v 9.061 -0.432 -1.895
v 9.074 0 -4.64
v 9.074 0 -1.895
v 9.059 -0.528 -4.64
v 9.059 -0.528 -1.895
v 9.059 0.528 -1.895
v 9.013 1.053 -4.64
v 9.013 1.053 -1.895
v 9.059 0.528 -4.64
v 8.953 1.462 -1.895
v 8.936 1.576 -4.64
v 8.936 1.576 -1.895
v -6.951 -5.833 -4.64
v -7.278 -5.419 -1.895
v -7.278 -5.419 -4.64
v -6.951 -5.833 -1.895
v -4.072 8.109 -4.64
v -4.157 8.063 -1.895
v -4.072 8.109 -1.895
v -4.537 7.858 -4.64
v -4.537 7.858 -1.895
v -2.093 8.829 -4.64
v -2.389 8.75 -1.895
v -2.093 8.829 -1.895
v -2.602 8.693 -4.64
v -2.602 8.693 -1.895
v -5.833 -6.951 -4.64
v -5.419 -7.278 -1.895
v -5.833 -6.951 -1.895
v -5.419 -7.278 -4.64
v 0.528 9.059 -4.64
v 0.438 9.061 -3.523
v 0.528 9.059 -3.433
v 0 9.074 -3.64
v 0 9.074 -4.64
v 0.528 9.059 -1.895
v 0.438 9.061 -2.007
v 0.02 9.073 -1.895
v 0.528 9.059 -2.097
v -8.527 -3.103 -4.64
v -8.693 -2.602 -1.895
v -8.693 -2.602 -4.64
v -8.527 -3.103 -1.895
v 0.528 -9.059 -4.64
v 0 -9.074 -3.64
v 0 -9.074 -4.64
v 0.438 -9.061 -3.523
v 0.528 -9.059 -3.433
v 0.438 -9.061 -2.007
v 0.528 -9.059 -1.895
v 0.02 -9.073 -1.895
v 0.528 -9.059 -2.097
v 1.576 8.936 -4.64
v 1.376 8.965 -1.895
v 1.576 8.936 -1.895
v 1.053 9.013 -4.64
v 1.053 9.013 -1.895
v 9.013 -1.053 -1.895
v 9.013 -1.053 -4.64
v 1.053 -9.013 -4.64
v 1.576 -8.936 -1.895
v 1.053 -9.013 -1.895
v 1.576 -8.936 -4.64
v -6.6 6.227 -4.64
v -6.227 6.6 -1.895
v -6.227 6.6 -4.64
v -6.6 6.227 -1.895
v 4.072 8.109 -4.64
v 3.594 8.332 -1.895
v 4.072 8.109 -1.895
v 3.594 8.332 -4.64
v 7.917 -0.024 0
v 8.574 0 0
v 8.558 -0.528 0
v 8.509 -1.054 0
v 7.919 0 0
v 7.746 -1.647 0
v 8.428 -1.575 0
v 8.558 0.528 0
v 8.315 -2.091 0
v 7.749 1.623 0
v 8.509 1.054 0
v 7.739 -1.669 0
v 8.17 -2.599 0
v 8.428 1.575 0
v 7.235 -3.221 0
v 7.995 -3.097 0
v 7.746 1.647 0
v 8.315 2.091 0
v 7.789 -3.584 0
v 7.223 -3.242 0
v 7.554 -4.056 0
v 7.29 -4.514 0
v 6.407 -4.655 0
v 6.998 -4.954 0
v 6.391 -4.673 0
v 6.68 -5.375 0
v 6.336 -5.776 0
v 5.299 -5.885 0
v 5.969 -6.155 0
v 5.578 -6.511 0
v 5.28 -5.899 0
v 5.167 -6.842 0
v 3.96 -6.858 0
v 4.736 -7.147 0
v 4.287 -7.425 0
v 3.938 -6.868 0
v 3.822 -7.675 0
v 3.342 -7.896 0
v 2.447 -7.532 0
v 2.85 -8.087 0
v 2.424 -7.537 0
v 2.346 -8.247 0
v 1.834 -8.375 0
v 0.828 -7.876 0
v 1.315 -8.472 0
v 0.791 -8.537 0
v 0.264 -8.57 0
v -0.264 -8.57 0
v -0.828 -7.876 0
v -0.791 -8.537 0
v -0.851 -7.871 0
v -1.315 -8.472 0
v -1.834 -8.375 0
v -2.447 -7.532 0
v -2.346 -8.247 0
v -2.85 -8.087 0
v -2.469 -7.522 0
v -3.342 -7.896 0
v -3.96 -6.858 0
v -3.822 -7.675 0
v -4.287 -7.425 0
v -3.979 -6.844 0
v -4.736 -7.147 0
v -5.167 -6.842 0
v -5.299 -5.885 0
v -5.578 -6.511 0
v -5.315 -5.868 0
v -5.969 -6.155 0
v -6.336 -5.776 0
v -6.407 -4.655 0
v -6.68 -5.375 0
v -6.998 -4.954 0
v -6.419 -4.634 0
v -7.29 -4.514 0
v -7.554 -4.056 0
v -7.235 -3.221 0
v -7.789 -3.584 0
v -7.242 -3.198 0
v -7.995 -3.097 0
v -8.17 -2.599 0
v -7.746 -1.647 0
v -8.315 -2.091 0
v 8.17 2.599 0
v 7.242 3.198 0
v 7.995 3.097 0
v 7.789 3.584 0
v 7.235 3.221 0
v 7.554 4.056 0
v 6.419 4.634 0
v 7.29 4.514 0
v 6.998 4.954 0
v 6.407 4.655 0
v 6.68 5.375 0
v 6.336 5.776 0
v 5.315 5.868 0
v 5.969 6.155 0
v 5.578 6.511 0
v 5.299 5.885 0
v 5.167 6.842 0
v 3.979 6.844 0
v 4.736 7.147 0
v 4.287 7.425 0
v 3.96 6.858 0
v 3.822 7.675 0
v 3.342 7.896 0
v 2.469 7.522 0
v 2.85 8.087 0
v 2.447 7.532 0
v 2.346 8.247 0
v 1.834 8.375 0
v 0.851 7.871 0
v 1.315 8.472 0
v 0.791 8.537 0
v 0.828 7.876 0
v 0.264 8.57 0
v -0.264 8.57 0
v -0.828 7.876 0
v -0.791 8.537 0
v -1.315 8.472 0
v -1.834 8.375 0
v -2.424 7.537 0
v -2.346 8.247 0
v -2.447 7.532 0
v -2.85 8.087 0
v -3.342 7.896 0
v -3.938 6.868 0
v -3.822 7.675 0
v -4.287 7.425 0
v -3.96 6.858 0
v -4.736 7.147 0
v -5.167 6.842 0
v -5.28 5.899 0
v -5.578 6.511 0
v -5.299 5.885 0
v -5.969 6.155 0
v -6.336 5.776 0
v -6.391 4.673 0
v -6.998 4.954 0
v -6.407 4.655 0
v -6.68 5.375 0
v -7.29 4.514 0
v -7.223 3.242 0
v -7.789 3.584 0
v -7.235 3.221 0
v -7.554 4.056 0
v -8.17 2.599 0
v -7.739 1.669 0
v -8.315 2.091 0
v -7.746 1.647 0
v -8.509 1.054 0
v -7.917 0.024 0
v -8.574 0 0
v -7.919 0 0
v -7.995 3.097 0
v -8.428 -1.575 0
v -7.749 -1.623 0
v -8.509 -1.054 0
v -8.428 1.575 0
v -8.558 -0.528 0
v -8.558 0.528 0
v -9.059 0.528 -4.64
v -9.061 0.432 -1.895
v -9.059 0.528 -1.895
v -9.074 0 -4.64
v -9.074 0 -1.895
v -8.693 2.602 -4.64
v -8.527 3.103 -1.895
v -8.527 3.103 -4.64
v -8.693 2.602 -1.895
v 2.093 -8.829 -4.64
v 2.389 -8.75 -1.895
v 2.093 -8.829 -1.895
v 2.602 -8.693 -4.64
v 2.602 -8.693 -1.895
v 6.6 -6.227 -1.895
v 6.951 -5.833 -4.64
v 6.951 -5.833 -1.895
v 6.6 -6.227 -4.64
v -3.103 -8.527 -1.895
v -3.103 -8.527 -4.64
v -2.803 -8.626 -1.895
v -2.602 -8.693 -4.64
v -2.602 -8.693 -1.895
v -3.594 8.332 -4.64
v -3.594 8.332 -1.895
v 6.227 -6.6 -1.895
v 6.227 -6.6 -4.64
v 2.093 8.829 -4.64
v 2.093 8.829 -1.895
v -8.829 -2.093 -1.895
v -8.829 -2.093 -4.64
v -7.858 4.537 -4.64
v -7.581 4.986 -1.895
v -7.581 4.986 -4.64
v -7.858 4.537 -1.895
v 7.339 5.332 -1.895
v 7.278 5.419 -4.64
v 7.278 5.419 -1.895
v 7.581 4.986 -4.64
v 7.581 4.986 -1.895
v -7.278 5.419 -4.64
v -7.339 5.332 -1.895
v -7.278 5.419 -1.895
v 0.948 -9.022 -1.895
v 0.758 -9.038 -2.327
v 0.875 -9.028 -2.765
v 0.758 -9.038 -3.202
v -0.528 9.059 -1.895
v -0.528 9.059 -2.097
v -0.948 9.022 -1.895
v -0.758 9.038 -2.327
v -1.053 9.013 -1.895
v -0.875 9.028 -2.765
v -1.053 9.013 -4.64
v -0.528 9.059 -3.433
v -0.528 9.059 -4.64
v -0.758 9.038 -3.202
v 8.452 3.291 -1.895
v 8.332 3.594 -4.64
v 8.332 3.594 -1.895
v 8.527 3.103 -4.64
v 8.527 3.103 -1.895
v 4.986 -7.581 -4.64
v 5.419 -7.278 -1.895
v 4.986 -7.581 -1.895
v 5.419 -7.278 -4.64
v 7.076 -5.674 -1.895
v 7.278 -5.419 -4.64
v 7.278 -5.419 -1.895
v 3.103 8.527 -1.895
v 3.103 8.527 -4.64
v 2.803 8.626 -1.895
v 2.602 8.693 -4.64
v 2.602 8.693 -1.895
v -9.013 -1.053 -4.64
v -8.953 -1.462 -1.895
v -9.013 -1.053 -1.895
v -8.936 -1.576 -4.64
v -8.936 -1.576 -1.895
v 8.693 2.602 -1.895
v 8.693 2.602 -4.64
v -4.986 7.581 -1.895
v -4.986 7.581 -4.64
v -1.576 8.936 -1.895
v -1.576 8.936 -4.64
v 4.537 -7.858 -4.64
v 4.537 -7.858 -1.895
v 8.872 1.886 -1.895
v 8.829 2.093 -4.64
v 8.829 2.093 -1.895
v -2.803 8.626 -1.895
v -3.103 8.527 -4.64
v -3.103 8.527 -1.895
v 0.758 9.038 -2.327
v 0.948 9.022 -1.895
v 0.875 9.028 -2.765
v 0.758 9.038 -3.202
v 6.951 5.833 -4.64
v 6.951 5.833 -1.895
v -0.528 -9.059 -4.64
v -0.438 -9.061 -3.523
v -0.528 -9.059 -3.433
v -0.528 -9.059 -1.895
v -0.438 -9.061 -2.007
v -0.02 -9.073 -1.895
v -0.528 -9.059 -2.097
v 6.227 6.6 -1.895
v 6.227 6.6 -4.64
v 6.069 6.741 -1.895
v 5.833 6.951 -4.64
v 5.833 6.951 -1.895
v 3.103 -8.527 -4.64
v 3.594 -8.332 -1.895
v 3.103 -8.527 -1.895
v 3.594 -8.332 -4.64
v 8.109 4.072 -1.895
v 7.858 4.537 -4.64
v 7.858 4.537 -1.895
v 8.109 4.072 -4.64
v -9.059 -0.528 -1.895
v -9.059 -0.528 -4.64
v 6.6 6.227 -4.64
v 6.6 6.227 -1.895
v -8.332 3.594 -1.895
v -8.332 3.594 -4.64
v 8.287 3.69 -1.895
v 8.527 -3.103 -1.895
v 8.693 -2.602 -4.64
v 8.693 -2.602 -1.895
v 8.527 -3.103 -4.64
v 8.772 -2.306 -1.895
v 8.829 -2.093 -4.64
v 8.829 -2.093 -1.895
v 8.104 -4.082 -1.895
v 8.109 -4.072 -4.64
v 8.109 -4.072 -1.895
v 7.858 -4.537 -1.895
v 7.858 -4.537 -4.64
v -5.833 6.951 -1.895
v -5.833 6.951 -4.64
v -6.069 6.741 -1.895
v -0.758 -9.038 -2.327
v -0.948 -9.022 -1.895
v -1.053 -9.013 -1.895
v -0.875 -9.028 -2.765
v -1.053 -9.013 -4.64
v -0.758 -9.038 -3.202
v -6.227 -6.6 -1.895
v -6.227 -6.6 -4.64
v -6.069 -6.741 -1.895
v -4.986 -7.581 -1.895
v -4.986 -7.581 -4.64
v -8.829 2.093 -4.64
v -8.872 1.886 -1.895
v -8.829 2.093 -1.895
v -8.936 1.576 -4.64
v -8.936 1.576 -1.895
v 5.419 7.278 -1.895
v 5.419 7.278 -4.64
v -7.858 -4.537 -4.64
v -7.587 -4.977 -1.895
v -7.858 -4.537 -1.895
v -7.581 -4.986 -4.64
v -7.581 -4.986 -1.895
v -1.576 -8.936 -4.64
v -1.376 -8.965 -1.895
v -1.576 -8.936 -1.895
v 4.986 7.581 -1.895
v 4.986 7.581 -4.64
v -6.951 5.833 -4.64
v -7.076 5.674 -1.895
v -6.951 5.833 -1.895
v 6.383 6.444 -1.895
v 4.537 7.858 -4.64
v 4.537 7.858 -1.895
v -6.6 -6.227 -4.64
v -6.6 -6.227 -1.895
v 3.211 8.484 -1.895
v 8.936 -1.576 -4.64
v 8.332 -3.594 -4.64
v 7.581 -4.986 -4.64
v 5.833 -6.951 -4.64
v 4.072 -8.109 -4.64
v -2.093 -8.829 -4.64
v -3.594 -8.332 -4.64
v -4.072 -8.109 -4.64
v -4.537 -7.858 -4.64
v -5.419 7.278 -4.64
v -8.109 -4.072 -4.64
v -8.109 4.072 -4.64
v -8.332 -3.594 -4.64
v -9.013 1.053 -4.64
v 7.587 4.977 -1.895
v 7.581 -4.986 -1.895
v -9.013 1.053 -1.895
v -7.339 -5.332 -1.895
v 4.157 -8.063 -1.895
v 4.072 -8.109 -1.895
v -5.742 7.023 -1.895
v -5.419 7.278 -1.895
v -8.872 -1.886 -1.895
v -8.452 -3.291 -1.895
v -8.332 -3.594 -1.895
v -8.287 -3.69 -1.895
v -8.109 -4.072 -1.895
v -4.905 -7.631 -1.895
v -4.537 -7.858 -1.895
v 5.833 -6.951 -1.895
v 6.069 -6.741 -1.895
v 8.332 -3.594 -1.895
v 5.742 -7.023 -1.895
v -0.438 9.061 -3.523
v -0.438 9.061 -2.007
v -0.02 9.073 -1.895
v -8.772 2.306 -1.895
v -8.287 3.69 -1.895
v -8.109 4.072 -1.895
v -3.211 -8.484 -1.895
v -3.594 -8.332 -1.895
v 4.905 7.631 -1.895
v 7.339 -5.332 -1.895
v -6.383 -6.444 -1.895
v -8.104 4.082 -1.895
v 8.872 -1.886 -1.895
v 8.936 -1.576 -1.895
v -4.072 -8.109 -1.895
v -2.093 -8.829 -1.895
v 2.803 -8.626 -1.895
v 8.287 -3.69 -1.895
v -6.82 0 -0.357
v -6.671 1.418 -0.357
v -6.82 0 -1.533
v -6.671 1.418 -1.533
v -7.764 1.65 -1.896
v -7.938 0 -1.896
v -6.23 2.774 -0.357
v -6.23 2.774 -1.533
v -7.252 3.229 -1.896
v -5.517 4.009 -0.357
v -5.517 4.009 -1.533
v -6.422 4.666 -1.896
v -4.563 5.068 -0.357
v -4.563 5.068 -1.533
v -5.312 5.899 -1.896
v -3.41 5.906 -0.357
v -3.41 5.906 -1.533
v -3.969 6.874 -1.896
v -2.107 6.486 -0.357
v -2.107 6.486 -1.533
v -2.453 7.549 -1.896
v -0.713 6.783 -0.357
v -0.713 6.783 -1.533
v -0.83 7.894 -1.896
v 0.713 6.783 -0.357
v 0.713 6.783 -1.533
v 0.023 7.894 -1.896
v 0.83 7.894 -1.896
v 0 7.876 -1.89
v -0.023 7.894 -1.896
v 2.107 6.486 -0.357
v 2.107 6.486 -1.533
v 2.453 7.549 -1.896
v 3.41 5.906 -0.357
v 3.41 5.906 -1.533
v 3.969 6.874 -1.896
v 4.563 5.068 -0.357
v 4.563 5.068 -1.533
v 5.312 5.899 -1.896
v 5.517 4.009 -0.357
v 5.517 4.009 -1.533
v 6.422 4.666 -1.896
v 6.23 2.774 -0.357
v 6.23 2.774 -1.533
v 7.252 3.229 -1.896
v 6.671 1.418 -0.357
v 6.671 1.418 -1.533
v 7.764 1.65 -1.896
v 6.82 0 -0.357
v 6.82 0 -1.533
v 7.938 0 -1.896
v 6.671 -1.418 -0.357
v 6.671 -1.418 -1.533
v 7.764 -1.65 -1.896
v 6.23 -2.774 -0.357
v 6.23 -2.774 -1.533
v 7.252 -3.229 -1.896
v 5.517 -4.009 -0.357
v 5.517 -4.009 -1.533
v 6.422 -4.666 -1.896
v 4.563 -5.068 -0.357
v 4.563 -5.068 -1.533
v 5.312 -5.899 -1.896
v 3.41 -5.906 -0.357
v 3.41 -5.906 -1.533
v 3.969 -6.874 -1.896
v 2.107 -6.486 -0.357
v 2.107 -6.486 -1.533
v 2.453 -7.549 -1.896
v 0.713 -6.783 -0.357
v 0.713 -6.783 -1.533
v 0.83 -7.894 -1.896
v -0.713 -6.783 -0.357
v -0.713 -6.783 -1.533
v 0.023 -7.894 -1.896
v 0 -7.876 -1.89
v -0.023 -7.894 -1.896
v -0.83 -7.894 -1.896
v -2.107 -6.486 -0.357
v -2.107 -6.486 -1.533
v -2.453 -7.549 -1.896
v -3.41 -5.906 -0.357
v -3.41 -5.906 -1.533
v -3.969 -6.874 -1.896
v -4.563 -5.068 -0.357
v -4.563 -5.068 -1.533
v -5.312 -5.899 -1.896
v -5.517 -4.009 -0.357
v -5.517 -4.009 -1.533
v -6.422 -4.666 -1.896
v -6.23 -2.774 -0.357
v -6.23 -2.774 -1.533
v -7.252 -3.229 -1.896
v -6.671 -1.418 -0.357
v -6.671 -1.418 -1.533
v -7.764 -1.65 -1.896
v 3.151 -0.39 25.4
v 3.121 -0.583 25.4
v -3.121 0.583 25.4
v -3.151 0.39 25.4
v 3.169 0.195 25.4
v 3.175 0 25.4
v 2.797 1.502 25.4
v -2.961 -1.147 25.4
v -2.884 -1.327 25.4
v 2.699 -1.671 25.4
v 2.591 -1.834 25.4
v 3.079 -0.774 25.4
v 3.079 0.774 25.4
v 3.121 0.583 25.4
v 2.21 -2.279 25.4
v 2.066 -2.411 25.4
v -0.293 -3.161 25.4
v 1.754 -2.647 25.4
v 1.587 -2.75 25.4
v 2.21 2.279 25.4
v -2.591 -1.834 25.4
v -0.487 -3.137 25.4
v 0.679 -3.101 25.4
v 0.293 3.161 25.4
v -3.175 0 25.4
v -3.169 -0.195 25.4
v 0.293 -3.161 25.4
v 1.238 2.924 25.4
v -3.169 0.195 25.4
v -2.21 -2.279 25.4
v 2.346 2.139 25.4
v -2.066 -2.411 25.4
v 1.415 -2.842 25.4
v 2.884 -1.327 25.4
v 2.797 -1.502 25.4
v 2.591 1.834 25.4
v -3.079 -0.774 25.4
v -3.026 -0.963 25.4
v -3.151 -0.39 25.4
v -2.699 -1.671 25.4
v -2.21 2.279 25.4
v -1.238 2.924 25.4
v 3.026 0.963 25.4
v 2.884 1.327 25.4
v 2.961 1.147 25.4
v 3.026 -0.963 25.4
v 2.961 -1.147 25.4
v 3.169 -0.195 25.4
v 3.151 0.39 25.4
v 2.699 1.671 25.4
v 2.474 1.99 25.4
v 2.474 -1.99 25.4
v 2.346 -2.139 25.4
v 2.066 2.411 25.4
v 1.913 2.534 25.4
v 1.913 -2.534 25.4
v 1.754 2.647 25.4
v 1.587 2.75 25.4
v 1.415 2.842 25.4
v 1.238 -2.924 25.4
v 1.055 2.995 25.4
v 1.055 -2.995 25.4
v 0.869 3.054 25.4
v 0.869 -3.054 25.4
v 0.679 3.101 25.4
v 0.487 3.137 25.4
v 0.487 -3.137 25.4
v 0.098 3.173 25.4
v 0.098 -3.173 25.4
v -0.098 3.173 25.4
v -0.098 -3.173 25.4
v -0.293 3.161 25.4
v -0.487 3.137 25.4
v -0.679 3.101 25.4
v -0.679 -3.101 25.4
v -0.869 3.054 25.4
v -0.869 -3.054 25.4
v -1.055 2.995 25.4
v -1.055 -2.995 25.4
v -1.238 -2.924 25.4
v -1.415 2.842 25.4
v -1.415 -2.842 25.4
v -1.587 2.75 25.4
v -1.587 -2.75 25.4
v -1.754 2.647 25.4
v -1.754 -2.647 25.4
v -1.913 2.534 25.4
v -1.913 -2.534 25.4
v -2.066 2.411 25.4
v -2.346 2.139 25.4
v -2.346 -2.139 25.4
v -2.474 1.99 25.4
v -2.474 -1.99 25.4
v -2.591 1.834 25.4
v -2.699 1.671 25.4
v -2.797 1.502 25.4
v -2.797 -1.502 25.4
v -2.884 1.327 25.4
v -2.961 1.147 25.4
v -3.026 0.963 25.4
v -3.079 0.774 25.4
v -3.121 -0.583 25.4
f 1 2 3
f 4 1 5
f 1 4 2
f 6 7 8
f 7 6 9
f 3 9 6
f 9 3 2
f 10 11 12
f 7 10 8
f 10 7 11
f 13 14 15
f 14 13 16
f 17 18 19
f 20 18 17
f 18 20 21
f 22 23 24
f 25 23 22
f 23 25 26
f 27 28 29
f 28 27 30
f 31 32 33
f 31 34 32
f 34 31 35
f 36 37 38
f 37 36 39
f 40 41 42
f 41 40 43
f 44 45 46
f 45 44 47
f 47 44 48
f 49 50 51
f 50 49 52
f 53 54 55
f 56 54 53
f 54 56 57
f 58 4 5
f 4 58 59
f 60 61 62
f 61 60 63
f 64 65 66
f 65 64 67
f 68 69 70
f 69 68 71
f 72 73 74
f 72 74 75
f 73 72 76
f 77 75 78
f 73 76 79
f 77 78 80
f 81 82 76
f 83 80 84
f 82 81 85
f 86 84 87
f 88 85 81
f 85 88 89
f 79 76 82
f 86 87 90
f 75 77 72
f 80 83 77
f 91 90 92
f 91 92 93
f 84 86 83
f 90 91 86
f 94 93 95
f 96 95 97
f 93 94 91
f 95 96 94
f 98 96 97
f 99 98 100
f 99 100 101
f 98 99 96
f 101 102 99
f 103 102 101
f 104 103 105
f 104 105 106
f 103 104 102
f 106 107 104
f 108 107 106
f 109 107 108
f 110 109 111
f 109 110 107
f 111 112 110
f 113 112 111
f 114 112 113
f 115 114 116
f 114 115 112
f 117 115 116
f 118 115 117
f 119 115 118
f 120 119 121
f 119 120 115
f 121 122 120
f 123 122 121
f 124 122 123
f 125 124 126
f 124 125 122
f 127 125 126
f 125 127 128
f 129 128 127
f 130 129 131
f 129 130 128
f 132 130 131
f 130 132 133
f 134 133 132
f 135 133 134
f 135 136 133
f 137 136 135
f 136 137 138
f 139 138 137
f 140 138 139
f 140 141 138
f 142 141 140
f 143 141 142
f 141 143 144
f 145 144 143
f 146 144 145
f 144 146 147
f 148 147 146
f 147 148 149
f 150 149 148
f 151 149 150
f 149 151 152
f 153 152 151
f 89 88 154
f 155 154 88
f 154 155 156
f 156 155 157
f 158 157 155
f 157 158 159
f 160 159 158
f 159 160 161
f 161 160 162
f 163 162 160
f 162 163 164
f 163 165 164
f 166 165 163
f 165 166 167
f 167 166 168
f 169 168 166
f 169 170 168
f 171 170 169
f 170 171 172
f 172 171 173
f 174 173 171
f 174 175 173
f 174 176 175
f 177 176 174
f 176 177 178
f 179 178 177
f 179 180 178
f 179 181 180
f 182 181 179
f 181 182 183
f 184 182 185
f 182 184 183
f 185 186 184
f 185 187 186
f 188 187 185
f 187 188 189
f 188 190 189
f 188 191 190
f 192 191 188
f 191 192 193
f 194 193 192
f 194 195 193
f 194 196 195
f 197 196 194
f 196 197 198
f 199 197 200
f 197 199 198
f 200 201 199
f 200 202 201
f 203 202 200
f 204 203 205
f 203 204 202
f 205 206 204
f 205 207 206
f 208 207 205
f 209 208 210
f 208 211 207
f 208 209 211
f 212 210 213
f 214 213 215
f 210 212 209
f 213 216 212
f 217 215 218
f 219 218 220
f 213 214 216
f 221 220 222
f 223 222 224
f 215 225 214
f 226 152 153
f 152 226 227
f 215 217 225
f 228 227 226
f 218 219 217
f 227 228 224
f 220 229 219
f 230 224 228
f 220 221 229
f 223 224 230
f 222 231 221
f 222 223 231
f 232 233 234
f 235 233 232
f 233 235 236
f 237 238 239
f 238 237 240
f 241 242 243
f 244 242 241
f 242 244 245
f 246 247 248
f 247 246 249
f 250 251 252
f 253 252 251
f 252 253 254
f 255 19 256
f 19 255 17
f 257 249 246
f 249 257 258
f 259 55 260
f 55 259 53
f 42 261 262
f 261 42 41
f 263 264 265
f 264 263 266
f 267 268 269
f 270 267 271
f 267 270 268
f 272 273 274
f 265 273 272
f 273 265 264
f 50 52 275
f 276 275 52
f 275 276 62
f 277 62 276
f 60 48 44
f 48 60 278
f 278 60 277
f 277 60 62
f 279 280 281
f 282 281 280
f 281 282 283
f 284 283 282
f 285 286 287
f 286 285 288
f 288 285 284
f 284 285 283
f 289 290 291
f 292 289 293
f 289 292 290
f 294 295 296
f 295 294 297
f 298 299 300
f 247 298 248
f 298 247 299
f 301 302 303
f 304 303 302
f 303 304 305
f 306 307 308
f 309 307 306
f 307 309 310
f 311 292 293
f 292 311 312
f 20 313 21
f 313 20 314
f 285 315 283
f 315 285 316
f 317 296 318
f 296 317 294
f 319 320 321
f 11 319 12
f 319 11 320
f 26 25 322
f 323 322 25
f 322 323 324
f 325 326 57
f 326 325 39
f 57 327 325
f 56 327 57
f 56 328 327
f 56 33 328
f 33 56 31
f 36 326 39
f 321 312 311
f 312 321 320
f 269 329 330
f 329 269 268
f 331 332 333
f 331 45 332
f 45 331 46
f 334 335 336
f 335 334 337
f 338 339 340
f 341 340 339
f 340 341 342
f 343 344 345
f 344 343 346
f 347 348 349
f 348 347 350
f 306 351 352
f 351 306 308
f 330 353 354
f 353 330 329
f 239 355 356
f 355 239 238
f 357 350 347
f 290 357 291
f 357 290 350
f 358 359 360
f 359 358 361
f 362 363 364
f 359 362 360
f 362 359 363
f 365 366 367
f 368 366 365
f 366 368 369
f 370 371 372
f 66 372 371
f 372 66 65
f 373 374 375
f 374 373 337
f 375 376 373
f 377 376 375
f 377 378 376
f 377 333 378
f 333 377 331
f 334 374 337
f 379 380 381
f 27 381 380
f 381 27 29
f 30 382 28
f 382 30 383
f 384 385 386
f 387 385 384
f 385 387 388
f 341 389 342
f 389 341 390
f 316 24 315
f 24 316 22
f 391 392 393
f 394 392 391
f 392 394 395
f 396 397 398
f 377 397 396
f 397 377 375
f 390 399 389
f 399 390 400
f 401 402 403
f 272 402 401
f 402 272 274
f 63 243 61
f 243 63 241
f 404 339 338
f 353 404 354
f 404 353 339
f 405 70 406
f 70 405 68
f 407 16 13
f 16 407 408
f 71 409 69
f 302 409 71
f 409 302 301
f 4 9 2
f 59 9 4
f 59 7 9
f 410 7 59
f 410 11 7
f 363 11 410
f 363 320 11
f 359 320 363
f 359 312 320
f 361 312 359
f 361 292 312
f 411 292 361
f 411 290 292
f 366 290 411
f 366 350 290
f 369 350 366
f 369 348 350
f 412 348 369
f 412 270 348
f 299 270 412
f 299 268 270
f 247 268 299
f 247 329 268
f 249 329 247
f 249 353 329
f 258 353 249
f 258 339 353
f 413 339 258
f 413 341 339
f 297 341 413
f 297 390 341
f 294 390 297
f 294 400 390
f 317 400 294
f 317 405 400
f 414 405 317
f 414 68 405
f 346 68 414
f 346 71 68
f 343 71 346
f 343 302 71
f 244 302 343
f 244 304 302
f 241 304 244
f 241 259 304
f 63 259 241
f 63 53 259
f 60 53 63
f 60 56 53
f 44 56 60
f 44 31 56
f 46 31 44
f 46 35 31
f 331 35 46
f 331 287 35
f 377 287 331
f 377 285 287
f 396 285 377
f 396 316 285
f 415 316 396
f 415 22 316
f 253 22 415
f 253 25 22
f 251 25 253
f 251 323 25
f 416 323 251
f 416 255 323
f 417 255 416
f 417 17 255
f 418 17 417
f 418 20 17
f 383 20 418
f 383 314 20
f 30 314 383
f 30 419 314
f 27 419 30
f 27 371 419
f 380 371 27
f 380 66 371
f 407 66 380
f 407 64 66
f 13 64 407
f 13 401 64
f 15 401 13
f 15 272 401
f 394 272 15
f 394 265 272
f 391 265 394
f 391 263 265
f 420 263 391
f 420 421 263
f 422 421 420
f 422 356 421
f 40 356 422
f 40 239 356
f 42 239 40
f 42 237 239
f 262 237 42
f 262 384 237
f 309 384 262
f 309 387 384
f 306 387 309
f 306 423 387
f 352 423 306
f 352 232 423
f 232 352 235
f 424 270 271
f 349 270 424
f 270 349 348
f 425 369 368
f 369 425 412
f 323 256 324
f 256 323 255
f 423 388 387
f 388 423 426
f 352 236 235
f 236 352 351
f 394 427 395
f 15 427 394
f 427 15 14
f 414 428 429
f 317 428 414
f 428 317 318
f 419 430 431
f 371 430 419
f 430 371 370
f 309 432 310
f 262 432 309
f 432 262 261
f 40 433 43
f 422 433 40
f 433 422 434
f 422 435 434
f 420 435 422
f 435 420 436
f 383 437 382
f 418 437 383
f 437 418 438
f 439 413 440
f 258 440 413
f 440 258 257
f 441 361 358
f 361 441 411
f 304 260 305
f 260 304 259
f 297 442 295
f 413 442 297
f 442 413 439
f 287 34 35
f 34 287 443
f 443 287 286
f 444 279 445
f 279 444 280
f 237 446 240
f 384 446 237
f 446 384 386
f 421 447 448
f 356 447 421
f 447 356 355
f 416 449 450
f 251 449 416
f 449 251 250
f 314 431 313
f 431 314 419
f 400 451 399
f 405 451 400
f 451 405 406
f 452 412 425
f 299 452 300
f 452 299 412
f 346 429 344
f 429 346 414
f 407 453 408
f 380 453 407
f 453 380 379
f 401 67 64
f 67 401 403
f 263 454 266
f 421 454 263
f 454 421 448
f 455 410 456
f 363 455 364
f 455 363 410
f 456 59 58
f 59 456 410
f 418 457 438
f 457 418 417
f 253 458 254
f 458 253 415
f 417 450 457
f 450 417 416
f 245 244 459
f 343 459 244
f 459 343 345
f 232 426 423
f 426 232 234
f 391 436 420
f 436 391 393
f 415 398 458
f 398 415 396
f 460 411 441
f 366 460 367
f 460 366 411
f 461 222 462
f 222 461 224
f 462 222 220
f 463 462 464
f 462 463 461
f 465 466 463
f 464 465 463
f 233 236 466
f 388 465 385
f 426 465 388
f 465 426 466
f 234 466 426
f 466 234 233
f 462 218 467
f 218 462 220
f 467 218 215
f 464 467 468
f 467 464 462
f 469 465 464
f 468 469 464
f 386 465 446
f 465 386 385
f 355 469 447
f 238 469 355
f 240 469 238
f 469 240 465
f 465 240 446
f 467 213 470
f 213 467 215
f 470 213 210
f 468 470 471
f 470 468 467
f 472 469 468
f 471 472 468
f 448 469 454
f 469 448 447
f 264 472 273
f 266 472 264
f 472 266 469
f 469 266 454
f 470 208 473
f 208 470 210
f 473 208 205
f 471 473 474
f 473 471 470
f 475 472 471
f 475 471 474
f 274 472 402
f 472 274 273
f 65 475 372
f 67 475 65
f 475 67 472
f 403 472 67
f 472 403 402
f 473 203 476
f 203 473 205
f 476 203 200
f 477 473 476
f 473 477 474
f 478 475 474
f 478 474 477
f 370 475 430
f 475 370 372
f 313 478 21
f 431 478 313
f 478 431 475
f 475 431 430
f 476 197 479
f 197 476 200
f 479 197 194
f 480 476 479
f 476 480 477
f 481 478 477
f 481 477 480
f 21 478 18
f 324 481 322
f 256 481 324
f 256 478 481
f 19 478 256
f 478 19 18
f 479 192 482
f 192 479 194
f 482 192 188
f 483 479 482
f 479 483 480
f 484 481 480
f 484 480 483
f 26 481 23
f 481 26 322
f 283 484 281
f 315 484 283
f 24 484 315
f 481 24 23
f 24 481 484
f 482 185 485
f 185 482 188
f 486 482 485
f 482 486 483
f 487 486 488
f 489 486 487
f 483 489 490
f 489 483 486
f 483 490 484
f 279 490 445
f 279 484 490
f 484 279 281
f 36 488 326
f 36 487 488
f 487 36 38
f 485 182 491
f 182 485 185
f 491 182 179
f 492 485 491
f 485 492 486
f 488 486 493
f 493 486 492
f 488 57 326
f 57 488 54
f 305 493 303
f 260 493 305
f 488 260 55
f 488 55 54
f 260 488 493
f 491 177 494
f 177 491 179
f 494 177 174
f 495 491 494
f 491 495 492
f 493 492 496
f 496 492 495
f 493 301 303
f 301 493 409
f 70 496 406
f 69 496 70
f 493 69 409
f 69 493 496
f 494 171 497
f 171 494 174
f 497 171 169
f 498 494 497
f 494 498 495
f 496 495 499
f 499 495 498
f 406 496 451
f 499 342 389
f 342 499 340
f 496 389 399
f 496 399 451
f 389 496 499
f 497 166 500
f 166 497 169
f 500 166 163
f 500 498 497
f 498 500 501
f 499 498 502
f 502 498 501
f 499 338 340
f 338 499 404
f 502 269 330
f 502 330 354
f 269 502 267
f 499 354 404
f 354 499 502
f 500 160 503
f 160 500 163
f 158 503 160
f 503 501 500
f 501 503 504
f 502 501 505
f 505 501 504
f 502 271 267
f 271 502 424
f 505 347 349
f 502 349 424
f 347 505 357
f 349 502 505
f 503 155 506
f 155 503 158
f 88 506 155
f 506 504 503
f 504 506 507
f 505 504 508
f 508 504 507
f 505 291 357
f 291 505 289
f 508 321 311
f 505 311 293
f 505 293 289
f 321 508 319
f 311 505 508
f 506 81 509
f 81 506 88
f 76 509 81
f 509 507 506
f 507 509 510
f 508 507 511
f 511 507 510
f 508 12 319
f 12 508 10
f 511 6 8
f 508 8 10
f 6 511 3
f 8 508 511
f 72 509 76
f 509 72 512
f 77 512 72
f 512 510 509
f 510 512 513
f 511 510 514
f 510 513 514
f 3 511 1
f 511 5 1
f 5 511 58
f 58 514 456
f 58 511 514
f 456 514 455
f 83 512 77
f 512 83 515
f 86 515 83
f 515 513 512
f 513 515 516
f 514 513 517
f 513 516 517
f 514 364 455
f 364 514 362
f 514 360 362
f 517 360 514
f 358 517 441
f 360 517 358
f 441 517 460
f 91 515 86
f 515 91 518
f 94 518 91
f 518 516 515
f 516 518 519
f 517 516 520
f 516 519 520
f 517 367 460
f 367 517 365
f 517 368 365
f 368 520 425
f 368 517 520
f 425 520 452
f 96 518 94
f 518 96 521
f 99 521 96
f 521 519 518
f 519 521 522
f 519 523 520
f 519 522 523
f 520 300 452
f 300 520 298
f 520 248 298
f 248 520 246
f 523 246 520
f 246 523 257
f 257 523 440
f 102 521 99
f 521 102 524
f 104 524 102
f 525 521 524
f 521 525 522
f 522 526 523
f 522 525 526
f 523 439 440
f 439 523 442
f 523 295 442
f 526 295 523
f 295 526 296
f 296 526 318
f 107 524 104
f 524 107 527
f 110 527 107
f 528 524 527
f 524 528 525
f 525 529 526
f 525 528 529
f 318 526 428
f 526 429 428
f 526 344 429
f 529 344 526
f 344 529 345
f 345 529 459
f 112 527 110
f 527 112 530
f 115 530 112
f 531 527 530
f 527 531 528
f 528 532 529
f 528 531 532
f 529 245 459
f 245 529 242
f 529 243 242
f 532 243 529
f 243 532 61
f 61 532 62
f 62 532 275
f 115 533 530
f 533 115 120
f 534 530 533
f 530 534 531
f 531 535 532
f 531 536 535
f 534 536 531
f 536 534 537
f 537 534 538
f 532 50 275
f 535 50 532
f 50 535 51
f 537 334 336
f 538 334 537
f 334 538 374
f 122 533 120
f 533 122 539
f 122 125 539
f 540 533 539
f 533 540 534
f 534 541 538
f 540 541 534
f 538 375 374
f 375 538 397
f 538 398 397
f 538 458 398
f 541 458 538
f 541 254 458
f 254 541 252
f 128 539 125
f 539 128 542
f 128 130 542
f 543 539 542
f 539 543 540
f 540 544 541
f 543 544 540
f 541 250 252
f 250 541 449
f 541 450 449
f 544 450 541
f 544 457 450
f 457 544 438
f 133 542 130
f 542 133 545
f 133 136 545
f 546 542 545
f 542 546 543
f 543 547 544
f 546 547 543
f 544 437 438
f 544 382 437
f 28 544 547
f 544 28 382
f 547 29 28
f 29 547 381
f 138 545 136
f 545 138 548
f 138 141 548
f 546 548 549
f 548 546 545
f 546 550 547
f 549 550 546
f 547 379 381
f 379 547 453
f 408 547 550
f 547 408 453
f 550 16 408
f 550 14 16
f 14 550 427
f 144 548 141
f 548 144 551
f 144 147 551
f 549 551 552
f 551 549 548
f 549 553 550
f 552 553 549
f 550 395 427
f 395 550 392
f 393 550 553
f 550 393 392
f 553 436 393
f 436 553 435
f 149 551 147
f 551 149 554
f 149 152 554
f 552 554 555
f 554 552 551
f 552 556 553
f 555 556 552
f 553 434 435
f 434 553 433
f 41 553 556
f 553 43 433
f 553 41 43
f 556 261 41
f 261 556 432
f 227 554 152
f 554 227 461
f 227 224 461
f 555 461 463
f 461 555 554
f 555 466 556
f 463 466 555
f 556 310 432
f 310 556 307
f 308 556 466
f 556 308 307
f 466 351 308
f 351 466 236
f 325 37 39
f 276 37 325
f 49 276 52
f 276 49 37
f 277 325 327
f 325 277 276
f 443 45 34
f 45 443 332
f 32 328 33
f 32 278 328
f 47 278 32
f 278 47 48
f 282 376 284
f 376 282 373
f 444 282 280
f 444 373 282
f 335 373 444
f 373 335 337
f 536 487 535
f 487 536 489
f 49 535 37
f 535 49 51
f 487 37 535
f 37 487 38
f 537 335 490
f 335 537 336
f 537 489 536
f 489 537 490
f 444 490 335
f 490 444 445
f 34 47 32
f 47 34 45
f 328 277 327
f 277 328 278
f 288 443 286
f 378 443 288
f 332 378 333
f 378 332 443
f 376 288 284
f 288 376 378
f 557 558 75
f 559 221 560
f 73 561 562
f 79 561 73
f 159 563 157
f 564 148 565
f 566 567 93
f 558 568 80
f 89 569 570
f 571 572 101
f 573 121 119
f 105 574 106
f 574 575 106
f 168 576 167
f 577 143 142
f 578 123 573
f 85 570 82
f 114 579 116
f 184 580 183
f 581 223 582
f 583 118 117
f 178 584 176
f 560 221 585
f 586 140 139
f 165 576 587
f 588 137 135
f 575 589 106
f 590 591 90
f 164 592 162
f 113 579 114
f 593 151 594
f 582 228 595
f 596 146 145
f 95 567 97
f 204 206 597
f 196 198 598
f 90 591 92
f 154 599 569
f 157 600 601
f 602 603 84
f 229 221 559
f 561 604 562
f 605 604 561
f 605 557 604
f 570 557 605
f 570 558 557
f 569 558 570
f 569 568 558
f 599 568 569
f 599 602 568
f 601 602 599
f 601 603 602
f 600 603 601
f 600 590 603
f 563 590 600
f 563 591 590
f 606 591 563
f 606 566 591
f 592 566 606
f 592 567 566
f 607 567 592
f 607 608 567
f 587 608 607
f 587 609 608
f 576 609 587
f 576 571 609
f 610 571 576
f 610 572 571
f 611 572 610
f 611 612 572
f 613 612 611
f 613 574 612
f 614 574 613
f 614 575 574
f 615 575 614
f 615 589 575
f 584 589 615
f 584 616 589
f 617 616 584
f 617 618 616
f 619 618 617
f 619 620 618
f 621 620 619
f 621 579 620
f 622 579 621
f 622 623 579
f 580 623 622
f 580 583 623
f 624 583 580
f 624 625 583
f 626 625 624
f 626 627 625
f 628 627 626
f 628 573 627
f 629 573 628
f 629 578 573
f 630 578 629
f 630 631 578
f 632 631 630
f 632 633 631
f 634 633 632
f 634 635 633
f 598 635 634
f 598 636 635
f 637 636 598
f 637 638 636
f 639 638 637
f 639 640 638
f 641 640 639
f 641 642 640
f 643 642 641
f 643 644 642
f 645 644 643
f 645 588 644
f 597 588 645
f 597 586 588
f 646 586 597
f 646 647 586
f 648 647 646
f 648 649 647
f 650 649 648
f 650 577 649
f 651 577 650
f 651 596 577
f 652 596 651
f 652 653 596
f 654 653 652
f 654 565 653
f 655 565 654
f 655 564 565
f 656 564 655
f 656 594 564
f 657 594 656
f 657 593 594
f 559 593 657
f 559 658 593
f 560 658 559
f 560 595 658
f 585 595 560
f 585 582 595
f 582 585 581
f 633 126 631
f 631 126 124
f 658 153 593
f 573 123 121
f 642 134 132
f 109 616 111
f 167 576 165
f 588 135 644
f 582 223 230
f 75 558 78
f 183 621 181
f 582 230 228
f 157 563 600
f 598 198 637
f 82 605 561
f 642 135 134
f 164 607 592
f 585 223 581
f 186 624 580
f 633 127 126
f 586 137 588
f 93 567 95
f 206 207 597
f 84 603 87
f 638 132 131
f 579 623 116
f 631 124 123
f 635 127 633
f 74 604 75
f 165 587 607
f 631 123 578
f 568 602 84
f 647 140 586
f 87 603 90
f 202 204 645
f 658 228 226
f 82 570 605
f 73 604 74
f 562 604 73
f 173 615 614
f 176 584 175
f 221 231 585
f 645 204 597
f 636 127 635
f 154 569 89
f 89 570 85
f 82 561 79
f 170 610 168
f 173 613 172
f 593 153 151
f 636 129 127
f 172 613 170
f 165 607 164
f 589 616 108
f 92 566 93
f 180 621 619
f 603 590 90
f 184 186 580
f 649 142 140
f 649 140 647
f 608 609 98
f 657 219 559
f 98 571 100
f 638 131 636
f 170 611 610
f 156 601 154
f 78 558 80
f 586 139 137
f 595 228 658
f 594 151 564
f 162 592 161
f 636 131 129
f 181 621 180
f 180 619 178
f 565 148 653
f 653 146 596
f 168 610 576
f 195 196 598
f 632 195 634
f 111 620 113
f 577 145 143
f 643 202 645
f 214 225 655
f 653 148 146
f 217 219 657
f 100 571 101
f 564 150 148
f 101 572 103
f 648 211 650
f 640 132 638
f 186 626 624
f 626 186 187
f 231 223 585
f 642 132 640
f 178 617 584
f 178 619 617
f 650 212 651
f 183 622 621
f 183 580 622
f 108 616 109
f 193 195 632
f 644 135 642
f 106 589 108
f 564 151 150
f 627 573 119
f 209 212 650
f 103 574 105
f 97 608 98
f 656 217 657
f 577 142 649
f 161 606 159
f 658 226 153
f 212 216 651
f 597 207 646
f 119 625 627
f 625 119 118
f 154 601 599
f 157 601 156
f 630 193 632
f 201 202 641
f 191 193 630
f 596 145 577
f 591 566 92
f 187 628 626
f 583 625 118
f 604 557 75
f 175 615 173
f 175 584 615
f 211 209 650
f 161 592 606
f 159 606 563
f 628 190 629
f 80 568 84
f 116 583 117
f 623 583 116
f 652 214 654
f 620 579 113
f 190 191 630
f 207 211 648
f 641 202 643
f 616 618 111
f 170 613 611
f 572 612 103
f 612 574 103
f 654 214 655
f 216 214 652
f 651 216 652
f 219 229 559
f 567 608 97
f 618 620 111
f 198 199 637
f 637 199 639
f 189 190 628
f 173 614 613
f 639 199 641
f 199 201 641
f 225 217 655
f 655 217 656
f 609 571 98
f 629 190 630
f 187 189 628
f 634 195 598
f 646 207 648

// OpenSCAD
/* 
A taper pin is a pin used in mechanical engineering to precisely align two parts.
https://en.wikipedia.org/wiki/Taper_pin

These normally have to work with a tapered reamer of a precise angle, but this
also lets you create a pin to fit whatever reamer you have.

A sample is provided for $3 harbor freight reamer.
SKU 66936
https://www.harborfreight.com/t-handle-reamer-66936.html

Licensed under Creative Commons + Attribution License

To fulfil the attribution requirement, please provide a link back to:
https://theheadlesssourceman.wordpress.com/2019/07/09/taper-pins/
*/

/* [main] */

// resolution 1=low(aka 1x) 2=mid 3=high
resfactor=4;

// diameter of starting hole
min_dia=6.35; // 1/4 inch

// length of the pin
length=25.4; // 1 inch

// MUST fill out the appropriate section below corresponding to your selection
calculate_taper_by=0; // [0:angle,1:reamer measurements,2:taper ratio]


/* [angle] */

angle=12;


/* [reamer measurements] */

// reamer diameter at one point
reamer_d1=11.18;

// reamer diameter at another point
reamer_d2=12.87;

// distance between two points (linear, not along taper)
reamer_dist=14.69;


/* [taper ratio] */

// common taper ratios are 1:48 (imperial) or 1:50 (metric)
taper_ratio_1_to=48;


/* [optional lanyard string attachment (so you don't lose your pin)] */

// Extend the pin and add a hole for a lanyard string so you don't lose the thing
lanyard=true;

// how big a hole for the string
lanyard_hole_dia=1.75;

// minimum amount of material around lanyard
lanyard_margin=1;

// add a gutter between the lanyard attachment and pin to discourage dust accumulation
lanyard_dust_gutter=1.89;


/* [hidden] */

// make $fn more automatic
function myfn(r)=max(3*r*resfactor,12);
module cyl(r=undef,h=undef,r1=undef,r2=undef){cylinder(r=r,h=h,r1=r1,r2=r2,$fn=myfn(r!=undef?r:max(r1,r2)));}
module circ(r=undef){circle(r=r,$fn=myfn(r));}
module ball(r=undef){sphere(r=r,$fn=myfn(r));}
module rotExt(r=undef){rotate_extrude(r,$fn=myfn(r)) children();}

taper_angle=calculate_taper_by==0?angle:calculate_taper_by==1?atan(abs(reamer_d1-reamer_d2)/2/reamer_dist):(atan(1/taper_ratio_1_to)/2);
max_dia=min_dia+2*length*tan(taper_angle);

lanyard_knob_dia=max(max_dia+1,lanyard_margin*2+lanyard_hole_dia);
lanyard_knob_h=lanyard_margin+lanyard_hole_dia;

cyl(r1=max_dia/2,r2=min_dia/2,h=length);
if(lanyard==true&&lanyard_hole_dia>0) difference(){
	translate([0,0,-(lanyard_knob_h+lanyard_dust_gutter)]) cyl(r=lanyard_knob_dia/2,h=lanyard_knob_h+lanyard_dust_gutter);
	translate([0,0,-lanyard_dust_gutter/2]) rotExt() { // dust gullet
		hull(){ 
			translate([max_dia/2-lanyard_dust_gutter/2,0])circ(r=lanyard_dust_gutter/2,$fn);
			translate([lanyard_knob_dia,0]) circle(r=lanyard_dust_gutter/2,$fn=4); // square
		}
		translate([max_dia/2,0]) square([lanyard_knob_dia,lanyard_dust_gutter]);
	}
	translate([0,lanyard_knob_dia,-lanyard_dust_gutter-lanyard_hole_dia/2]) rotate([90,0,0]) cyl(r=lanyard_hole_dia/2,h=lanyard_knob_dia*2,$fn=12);
}
